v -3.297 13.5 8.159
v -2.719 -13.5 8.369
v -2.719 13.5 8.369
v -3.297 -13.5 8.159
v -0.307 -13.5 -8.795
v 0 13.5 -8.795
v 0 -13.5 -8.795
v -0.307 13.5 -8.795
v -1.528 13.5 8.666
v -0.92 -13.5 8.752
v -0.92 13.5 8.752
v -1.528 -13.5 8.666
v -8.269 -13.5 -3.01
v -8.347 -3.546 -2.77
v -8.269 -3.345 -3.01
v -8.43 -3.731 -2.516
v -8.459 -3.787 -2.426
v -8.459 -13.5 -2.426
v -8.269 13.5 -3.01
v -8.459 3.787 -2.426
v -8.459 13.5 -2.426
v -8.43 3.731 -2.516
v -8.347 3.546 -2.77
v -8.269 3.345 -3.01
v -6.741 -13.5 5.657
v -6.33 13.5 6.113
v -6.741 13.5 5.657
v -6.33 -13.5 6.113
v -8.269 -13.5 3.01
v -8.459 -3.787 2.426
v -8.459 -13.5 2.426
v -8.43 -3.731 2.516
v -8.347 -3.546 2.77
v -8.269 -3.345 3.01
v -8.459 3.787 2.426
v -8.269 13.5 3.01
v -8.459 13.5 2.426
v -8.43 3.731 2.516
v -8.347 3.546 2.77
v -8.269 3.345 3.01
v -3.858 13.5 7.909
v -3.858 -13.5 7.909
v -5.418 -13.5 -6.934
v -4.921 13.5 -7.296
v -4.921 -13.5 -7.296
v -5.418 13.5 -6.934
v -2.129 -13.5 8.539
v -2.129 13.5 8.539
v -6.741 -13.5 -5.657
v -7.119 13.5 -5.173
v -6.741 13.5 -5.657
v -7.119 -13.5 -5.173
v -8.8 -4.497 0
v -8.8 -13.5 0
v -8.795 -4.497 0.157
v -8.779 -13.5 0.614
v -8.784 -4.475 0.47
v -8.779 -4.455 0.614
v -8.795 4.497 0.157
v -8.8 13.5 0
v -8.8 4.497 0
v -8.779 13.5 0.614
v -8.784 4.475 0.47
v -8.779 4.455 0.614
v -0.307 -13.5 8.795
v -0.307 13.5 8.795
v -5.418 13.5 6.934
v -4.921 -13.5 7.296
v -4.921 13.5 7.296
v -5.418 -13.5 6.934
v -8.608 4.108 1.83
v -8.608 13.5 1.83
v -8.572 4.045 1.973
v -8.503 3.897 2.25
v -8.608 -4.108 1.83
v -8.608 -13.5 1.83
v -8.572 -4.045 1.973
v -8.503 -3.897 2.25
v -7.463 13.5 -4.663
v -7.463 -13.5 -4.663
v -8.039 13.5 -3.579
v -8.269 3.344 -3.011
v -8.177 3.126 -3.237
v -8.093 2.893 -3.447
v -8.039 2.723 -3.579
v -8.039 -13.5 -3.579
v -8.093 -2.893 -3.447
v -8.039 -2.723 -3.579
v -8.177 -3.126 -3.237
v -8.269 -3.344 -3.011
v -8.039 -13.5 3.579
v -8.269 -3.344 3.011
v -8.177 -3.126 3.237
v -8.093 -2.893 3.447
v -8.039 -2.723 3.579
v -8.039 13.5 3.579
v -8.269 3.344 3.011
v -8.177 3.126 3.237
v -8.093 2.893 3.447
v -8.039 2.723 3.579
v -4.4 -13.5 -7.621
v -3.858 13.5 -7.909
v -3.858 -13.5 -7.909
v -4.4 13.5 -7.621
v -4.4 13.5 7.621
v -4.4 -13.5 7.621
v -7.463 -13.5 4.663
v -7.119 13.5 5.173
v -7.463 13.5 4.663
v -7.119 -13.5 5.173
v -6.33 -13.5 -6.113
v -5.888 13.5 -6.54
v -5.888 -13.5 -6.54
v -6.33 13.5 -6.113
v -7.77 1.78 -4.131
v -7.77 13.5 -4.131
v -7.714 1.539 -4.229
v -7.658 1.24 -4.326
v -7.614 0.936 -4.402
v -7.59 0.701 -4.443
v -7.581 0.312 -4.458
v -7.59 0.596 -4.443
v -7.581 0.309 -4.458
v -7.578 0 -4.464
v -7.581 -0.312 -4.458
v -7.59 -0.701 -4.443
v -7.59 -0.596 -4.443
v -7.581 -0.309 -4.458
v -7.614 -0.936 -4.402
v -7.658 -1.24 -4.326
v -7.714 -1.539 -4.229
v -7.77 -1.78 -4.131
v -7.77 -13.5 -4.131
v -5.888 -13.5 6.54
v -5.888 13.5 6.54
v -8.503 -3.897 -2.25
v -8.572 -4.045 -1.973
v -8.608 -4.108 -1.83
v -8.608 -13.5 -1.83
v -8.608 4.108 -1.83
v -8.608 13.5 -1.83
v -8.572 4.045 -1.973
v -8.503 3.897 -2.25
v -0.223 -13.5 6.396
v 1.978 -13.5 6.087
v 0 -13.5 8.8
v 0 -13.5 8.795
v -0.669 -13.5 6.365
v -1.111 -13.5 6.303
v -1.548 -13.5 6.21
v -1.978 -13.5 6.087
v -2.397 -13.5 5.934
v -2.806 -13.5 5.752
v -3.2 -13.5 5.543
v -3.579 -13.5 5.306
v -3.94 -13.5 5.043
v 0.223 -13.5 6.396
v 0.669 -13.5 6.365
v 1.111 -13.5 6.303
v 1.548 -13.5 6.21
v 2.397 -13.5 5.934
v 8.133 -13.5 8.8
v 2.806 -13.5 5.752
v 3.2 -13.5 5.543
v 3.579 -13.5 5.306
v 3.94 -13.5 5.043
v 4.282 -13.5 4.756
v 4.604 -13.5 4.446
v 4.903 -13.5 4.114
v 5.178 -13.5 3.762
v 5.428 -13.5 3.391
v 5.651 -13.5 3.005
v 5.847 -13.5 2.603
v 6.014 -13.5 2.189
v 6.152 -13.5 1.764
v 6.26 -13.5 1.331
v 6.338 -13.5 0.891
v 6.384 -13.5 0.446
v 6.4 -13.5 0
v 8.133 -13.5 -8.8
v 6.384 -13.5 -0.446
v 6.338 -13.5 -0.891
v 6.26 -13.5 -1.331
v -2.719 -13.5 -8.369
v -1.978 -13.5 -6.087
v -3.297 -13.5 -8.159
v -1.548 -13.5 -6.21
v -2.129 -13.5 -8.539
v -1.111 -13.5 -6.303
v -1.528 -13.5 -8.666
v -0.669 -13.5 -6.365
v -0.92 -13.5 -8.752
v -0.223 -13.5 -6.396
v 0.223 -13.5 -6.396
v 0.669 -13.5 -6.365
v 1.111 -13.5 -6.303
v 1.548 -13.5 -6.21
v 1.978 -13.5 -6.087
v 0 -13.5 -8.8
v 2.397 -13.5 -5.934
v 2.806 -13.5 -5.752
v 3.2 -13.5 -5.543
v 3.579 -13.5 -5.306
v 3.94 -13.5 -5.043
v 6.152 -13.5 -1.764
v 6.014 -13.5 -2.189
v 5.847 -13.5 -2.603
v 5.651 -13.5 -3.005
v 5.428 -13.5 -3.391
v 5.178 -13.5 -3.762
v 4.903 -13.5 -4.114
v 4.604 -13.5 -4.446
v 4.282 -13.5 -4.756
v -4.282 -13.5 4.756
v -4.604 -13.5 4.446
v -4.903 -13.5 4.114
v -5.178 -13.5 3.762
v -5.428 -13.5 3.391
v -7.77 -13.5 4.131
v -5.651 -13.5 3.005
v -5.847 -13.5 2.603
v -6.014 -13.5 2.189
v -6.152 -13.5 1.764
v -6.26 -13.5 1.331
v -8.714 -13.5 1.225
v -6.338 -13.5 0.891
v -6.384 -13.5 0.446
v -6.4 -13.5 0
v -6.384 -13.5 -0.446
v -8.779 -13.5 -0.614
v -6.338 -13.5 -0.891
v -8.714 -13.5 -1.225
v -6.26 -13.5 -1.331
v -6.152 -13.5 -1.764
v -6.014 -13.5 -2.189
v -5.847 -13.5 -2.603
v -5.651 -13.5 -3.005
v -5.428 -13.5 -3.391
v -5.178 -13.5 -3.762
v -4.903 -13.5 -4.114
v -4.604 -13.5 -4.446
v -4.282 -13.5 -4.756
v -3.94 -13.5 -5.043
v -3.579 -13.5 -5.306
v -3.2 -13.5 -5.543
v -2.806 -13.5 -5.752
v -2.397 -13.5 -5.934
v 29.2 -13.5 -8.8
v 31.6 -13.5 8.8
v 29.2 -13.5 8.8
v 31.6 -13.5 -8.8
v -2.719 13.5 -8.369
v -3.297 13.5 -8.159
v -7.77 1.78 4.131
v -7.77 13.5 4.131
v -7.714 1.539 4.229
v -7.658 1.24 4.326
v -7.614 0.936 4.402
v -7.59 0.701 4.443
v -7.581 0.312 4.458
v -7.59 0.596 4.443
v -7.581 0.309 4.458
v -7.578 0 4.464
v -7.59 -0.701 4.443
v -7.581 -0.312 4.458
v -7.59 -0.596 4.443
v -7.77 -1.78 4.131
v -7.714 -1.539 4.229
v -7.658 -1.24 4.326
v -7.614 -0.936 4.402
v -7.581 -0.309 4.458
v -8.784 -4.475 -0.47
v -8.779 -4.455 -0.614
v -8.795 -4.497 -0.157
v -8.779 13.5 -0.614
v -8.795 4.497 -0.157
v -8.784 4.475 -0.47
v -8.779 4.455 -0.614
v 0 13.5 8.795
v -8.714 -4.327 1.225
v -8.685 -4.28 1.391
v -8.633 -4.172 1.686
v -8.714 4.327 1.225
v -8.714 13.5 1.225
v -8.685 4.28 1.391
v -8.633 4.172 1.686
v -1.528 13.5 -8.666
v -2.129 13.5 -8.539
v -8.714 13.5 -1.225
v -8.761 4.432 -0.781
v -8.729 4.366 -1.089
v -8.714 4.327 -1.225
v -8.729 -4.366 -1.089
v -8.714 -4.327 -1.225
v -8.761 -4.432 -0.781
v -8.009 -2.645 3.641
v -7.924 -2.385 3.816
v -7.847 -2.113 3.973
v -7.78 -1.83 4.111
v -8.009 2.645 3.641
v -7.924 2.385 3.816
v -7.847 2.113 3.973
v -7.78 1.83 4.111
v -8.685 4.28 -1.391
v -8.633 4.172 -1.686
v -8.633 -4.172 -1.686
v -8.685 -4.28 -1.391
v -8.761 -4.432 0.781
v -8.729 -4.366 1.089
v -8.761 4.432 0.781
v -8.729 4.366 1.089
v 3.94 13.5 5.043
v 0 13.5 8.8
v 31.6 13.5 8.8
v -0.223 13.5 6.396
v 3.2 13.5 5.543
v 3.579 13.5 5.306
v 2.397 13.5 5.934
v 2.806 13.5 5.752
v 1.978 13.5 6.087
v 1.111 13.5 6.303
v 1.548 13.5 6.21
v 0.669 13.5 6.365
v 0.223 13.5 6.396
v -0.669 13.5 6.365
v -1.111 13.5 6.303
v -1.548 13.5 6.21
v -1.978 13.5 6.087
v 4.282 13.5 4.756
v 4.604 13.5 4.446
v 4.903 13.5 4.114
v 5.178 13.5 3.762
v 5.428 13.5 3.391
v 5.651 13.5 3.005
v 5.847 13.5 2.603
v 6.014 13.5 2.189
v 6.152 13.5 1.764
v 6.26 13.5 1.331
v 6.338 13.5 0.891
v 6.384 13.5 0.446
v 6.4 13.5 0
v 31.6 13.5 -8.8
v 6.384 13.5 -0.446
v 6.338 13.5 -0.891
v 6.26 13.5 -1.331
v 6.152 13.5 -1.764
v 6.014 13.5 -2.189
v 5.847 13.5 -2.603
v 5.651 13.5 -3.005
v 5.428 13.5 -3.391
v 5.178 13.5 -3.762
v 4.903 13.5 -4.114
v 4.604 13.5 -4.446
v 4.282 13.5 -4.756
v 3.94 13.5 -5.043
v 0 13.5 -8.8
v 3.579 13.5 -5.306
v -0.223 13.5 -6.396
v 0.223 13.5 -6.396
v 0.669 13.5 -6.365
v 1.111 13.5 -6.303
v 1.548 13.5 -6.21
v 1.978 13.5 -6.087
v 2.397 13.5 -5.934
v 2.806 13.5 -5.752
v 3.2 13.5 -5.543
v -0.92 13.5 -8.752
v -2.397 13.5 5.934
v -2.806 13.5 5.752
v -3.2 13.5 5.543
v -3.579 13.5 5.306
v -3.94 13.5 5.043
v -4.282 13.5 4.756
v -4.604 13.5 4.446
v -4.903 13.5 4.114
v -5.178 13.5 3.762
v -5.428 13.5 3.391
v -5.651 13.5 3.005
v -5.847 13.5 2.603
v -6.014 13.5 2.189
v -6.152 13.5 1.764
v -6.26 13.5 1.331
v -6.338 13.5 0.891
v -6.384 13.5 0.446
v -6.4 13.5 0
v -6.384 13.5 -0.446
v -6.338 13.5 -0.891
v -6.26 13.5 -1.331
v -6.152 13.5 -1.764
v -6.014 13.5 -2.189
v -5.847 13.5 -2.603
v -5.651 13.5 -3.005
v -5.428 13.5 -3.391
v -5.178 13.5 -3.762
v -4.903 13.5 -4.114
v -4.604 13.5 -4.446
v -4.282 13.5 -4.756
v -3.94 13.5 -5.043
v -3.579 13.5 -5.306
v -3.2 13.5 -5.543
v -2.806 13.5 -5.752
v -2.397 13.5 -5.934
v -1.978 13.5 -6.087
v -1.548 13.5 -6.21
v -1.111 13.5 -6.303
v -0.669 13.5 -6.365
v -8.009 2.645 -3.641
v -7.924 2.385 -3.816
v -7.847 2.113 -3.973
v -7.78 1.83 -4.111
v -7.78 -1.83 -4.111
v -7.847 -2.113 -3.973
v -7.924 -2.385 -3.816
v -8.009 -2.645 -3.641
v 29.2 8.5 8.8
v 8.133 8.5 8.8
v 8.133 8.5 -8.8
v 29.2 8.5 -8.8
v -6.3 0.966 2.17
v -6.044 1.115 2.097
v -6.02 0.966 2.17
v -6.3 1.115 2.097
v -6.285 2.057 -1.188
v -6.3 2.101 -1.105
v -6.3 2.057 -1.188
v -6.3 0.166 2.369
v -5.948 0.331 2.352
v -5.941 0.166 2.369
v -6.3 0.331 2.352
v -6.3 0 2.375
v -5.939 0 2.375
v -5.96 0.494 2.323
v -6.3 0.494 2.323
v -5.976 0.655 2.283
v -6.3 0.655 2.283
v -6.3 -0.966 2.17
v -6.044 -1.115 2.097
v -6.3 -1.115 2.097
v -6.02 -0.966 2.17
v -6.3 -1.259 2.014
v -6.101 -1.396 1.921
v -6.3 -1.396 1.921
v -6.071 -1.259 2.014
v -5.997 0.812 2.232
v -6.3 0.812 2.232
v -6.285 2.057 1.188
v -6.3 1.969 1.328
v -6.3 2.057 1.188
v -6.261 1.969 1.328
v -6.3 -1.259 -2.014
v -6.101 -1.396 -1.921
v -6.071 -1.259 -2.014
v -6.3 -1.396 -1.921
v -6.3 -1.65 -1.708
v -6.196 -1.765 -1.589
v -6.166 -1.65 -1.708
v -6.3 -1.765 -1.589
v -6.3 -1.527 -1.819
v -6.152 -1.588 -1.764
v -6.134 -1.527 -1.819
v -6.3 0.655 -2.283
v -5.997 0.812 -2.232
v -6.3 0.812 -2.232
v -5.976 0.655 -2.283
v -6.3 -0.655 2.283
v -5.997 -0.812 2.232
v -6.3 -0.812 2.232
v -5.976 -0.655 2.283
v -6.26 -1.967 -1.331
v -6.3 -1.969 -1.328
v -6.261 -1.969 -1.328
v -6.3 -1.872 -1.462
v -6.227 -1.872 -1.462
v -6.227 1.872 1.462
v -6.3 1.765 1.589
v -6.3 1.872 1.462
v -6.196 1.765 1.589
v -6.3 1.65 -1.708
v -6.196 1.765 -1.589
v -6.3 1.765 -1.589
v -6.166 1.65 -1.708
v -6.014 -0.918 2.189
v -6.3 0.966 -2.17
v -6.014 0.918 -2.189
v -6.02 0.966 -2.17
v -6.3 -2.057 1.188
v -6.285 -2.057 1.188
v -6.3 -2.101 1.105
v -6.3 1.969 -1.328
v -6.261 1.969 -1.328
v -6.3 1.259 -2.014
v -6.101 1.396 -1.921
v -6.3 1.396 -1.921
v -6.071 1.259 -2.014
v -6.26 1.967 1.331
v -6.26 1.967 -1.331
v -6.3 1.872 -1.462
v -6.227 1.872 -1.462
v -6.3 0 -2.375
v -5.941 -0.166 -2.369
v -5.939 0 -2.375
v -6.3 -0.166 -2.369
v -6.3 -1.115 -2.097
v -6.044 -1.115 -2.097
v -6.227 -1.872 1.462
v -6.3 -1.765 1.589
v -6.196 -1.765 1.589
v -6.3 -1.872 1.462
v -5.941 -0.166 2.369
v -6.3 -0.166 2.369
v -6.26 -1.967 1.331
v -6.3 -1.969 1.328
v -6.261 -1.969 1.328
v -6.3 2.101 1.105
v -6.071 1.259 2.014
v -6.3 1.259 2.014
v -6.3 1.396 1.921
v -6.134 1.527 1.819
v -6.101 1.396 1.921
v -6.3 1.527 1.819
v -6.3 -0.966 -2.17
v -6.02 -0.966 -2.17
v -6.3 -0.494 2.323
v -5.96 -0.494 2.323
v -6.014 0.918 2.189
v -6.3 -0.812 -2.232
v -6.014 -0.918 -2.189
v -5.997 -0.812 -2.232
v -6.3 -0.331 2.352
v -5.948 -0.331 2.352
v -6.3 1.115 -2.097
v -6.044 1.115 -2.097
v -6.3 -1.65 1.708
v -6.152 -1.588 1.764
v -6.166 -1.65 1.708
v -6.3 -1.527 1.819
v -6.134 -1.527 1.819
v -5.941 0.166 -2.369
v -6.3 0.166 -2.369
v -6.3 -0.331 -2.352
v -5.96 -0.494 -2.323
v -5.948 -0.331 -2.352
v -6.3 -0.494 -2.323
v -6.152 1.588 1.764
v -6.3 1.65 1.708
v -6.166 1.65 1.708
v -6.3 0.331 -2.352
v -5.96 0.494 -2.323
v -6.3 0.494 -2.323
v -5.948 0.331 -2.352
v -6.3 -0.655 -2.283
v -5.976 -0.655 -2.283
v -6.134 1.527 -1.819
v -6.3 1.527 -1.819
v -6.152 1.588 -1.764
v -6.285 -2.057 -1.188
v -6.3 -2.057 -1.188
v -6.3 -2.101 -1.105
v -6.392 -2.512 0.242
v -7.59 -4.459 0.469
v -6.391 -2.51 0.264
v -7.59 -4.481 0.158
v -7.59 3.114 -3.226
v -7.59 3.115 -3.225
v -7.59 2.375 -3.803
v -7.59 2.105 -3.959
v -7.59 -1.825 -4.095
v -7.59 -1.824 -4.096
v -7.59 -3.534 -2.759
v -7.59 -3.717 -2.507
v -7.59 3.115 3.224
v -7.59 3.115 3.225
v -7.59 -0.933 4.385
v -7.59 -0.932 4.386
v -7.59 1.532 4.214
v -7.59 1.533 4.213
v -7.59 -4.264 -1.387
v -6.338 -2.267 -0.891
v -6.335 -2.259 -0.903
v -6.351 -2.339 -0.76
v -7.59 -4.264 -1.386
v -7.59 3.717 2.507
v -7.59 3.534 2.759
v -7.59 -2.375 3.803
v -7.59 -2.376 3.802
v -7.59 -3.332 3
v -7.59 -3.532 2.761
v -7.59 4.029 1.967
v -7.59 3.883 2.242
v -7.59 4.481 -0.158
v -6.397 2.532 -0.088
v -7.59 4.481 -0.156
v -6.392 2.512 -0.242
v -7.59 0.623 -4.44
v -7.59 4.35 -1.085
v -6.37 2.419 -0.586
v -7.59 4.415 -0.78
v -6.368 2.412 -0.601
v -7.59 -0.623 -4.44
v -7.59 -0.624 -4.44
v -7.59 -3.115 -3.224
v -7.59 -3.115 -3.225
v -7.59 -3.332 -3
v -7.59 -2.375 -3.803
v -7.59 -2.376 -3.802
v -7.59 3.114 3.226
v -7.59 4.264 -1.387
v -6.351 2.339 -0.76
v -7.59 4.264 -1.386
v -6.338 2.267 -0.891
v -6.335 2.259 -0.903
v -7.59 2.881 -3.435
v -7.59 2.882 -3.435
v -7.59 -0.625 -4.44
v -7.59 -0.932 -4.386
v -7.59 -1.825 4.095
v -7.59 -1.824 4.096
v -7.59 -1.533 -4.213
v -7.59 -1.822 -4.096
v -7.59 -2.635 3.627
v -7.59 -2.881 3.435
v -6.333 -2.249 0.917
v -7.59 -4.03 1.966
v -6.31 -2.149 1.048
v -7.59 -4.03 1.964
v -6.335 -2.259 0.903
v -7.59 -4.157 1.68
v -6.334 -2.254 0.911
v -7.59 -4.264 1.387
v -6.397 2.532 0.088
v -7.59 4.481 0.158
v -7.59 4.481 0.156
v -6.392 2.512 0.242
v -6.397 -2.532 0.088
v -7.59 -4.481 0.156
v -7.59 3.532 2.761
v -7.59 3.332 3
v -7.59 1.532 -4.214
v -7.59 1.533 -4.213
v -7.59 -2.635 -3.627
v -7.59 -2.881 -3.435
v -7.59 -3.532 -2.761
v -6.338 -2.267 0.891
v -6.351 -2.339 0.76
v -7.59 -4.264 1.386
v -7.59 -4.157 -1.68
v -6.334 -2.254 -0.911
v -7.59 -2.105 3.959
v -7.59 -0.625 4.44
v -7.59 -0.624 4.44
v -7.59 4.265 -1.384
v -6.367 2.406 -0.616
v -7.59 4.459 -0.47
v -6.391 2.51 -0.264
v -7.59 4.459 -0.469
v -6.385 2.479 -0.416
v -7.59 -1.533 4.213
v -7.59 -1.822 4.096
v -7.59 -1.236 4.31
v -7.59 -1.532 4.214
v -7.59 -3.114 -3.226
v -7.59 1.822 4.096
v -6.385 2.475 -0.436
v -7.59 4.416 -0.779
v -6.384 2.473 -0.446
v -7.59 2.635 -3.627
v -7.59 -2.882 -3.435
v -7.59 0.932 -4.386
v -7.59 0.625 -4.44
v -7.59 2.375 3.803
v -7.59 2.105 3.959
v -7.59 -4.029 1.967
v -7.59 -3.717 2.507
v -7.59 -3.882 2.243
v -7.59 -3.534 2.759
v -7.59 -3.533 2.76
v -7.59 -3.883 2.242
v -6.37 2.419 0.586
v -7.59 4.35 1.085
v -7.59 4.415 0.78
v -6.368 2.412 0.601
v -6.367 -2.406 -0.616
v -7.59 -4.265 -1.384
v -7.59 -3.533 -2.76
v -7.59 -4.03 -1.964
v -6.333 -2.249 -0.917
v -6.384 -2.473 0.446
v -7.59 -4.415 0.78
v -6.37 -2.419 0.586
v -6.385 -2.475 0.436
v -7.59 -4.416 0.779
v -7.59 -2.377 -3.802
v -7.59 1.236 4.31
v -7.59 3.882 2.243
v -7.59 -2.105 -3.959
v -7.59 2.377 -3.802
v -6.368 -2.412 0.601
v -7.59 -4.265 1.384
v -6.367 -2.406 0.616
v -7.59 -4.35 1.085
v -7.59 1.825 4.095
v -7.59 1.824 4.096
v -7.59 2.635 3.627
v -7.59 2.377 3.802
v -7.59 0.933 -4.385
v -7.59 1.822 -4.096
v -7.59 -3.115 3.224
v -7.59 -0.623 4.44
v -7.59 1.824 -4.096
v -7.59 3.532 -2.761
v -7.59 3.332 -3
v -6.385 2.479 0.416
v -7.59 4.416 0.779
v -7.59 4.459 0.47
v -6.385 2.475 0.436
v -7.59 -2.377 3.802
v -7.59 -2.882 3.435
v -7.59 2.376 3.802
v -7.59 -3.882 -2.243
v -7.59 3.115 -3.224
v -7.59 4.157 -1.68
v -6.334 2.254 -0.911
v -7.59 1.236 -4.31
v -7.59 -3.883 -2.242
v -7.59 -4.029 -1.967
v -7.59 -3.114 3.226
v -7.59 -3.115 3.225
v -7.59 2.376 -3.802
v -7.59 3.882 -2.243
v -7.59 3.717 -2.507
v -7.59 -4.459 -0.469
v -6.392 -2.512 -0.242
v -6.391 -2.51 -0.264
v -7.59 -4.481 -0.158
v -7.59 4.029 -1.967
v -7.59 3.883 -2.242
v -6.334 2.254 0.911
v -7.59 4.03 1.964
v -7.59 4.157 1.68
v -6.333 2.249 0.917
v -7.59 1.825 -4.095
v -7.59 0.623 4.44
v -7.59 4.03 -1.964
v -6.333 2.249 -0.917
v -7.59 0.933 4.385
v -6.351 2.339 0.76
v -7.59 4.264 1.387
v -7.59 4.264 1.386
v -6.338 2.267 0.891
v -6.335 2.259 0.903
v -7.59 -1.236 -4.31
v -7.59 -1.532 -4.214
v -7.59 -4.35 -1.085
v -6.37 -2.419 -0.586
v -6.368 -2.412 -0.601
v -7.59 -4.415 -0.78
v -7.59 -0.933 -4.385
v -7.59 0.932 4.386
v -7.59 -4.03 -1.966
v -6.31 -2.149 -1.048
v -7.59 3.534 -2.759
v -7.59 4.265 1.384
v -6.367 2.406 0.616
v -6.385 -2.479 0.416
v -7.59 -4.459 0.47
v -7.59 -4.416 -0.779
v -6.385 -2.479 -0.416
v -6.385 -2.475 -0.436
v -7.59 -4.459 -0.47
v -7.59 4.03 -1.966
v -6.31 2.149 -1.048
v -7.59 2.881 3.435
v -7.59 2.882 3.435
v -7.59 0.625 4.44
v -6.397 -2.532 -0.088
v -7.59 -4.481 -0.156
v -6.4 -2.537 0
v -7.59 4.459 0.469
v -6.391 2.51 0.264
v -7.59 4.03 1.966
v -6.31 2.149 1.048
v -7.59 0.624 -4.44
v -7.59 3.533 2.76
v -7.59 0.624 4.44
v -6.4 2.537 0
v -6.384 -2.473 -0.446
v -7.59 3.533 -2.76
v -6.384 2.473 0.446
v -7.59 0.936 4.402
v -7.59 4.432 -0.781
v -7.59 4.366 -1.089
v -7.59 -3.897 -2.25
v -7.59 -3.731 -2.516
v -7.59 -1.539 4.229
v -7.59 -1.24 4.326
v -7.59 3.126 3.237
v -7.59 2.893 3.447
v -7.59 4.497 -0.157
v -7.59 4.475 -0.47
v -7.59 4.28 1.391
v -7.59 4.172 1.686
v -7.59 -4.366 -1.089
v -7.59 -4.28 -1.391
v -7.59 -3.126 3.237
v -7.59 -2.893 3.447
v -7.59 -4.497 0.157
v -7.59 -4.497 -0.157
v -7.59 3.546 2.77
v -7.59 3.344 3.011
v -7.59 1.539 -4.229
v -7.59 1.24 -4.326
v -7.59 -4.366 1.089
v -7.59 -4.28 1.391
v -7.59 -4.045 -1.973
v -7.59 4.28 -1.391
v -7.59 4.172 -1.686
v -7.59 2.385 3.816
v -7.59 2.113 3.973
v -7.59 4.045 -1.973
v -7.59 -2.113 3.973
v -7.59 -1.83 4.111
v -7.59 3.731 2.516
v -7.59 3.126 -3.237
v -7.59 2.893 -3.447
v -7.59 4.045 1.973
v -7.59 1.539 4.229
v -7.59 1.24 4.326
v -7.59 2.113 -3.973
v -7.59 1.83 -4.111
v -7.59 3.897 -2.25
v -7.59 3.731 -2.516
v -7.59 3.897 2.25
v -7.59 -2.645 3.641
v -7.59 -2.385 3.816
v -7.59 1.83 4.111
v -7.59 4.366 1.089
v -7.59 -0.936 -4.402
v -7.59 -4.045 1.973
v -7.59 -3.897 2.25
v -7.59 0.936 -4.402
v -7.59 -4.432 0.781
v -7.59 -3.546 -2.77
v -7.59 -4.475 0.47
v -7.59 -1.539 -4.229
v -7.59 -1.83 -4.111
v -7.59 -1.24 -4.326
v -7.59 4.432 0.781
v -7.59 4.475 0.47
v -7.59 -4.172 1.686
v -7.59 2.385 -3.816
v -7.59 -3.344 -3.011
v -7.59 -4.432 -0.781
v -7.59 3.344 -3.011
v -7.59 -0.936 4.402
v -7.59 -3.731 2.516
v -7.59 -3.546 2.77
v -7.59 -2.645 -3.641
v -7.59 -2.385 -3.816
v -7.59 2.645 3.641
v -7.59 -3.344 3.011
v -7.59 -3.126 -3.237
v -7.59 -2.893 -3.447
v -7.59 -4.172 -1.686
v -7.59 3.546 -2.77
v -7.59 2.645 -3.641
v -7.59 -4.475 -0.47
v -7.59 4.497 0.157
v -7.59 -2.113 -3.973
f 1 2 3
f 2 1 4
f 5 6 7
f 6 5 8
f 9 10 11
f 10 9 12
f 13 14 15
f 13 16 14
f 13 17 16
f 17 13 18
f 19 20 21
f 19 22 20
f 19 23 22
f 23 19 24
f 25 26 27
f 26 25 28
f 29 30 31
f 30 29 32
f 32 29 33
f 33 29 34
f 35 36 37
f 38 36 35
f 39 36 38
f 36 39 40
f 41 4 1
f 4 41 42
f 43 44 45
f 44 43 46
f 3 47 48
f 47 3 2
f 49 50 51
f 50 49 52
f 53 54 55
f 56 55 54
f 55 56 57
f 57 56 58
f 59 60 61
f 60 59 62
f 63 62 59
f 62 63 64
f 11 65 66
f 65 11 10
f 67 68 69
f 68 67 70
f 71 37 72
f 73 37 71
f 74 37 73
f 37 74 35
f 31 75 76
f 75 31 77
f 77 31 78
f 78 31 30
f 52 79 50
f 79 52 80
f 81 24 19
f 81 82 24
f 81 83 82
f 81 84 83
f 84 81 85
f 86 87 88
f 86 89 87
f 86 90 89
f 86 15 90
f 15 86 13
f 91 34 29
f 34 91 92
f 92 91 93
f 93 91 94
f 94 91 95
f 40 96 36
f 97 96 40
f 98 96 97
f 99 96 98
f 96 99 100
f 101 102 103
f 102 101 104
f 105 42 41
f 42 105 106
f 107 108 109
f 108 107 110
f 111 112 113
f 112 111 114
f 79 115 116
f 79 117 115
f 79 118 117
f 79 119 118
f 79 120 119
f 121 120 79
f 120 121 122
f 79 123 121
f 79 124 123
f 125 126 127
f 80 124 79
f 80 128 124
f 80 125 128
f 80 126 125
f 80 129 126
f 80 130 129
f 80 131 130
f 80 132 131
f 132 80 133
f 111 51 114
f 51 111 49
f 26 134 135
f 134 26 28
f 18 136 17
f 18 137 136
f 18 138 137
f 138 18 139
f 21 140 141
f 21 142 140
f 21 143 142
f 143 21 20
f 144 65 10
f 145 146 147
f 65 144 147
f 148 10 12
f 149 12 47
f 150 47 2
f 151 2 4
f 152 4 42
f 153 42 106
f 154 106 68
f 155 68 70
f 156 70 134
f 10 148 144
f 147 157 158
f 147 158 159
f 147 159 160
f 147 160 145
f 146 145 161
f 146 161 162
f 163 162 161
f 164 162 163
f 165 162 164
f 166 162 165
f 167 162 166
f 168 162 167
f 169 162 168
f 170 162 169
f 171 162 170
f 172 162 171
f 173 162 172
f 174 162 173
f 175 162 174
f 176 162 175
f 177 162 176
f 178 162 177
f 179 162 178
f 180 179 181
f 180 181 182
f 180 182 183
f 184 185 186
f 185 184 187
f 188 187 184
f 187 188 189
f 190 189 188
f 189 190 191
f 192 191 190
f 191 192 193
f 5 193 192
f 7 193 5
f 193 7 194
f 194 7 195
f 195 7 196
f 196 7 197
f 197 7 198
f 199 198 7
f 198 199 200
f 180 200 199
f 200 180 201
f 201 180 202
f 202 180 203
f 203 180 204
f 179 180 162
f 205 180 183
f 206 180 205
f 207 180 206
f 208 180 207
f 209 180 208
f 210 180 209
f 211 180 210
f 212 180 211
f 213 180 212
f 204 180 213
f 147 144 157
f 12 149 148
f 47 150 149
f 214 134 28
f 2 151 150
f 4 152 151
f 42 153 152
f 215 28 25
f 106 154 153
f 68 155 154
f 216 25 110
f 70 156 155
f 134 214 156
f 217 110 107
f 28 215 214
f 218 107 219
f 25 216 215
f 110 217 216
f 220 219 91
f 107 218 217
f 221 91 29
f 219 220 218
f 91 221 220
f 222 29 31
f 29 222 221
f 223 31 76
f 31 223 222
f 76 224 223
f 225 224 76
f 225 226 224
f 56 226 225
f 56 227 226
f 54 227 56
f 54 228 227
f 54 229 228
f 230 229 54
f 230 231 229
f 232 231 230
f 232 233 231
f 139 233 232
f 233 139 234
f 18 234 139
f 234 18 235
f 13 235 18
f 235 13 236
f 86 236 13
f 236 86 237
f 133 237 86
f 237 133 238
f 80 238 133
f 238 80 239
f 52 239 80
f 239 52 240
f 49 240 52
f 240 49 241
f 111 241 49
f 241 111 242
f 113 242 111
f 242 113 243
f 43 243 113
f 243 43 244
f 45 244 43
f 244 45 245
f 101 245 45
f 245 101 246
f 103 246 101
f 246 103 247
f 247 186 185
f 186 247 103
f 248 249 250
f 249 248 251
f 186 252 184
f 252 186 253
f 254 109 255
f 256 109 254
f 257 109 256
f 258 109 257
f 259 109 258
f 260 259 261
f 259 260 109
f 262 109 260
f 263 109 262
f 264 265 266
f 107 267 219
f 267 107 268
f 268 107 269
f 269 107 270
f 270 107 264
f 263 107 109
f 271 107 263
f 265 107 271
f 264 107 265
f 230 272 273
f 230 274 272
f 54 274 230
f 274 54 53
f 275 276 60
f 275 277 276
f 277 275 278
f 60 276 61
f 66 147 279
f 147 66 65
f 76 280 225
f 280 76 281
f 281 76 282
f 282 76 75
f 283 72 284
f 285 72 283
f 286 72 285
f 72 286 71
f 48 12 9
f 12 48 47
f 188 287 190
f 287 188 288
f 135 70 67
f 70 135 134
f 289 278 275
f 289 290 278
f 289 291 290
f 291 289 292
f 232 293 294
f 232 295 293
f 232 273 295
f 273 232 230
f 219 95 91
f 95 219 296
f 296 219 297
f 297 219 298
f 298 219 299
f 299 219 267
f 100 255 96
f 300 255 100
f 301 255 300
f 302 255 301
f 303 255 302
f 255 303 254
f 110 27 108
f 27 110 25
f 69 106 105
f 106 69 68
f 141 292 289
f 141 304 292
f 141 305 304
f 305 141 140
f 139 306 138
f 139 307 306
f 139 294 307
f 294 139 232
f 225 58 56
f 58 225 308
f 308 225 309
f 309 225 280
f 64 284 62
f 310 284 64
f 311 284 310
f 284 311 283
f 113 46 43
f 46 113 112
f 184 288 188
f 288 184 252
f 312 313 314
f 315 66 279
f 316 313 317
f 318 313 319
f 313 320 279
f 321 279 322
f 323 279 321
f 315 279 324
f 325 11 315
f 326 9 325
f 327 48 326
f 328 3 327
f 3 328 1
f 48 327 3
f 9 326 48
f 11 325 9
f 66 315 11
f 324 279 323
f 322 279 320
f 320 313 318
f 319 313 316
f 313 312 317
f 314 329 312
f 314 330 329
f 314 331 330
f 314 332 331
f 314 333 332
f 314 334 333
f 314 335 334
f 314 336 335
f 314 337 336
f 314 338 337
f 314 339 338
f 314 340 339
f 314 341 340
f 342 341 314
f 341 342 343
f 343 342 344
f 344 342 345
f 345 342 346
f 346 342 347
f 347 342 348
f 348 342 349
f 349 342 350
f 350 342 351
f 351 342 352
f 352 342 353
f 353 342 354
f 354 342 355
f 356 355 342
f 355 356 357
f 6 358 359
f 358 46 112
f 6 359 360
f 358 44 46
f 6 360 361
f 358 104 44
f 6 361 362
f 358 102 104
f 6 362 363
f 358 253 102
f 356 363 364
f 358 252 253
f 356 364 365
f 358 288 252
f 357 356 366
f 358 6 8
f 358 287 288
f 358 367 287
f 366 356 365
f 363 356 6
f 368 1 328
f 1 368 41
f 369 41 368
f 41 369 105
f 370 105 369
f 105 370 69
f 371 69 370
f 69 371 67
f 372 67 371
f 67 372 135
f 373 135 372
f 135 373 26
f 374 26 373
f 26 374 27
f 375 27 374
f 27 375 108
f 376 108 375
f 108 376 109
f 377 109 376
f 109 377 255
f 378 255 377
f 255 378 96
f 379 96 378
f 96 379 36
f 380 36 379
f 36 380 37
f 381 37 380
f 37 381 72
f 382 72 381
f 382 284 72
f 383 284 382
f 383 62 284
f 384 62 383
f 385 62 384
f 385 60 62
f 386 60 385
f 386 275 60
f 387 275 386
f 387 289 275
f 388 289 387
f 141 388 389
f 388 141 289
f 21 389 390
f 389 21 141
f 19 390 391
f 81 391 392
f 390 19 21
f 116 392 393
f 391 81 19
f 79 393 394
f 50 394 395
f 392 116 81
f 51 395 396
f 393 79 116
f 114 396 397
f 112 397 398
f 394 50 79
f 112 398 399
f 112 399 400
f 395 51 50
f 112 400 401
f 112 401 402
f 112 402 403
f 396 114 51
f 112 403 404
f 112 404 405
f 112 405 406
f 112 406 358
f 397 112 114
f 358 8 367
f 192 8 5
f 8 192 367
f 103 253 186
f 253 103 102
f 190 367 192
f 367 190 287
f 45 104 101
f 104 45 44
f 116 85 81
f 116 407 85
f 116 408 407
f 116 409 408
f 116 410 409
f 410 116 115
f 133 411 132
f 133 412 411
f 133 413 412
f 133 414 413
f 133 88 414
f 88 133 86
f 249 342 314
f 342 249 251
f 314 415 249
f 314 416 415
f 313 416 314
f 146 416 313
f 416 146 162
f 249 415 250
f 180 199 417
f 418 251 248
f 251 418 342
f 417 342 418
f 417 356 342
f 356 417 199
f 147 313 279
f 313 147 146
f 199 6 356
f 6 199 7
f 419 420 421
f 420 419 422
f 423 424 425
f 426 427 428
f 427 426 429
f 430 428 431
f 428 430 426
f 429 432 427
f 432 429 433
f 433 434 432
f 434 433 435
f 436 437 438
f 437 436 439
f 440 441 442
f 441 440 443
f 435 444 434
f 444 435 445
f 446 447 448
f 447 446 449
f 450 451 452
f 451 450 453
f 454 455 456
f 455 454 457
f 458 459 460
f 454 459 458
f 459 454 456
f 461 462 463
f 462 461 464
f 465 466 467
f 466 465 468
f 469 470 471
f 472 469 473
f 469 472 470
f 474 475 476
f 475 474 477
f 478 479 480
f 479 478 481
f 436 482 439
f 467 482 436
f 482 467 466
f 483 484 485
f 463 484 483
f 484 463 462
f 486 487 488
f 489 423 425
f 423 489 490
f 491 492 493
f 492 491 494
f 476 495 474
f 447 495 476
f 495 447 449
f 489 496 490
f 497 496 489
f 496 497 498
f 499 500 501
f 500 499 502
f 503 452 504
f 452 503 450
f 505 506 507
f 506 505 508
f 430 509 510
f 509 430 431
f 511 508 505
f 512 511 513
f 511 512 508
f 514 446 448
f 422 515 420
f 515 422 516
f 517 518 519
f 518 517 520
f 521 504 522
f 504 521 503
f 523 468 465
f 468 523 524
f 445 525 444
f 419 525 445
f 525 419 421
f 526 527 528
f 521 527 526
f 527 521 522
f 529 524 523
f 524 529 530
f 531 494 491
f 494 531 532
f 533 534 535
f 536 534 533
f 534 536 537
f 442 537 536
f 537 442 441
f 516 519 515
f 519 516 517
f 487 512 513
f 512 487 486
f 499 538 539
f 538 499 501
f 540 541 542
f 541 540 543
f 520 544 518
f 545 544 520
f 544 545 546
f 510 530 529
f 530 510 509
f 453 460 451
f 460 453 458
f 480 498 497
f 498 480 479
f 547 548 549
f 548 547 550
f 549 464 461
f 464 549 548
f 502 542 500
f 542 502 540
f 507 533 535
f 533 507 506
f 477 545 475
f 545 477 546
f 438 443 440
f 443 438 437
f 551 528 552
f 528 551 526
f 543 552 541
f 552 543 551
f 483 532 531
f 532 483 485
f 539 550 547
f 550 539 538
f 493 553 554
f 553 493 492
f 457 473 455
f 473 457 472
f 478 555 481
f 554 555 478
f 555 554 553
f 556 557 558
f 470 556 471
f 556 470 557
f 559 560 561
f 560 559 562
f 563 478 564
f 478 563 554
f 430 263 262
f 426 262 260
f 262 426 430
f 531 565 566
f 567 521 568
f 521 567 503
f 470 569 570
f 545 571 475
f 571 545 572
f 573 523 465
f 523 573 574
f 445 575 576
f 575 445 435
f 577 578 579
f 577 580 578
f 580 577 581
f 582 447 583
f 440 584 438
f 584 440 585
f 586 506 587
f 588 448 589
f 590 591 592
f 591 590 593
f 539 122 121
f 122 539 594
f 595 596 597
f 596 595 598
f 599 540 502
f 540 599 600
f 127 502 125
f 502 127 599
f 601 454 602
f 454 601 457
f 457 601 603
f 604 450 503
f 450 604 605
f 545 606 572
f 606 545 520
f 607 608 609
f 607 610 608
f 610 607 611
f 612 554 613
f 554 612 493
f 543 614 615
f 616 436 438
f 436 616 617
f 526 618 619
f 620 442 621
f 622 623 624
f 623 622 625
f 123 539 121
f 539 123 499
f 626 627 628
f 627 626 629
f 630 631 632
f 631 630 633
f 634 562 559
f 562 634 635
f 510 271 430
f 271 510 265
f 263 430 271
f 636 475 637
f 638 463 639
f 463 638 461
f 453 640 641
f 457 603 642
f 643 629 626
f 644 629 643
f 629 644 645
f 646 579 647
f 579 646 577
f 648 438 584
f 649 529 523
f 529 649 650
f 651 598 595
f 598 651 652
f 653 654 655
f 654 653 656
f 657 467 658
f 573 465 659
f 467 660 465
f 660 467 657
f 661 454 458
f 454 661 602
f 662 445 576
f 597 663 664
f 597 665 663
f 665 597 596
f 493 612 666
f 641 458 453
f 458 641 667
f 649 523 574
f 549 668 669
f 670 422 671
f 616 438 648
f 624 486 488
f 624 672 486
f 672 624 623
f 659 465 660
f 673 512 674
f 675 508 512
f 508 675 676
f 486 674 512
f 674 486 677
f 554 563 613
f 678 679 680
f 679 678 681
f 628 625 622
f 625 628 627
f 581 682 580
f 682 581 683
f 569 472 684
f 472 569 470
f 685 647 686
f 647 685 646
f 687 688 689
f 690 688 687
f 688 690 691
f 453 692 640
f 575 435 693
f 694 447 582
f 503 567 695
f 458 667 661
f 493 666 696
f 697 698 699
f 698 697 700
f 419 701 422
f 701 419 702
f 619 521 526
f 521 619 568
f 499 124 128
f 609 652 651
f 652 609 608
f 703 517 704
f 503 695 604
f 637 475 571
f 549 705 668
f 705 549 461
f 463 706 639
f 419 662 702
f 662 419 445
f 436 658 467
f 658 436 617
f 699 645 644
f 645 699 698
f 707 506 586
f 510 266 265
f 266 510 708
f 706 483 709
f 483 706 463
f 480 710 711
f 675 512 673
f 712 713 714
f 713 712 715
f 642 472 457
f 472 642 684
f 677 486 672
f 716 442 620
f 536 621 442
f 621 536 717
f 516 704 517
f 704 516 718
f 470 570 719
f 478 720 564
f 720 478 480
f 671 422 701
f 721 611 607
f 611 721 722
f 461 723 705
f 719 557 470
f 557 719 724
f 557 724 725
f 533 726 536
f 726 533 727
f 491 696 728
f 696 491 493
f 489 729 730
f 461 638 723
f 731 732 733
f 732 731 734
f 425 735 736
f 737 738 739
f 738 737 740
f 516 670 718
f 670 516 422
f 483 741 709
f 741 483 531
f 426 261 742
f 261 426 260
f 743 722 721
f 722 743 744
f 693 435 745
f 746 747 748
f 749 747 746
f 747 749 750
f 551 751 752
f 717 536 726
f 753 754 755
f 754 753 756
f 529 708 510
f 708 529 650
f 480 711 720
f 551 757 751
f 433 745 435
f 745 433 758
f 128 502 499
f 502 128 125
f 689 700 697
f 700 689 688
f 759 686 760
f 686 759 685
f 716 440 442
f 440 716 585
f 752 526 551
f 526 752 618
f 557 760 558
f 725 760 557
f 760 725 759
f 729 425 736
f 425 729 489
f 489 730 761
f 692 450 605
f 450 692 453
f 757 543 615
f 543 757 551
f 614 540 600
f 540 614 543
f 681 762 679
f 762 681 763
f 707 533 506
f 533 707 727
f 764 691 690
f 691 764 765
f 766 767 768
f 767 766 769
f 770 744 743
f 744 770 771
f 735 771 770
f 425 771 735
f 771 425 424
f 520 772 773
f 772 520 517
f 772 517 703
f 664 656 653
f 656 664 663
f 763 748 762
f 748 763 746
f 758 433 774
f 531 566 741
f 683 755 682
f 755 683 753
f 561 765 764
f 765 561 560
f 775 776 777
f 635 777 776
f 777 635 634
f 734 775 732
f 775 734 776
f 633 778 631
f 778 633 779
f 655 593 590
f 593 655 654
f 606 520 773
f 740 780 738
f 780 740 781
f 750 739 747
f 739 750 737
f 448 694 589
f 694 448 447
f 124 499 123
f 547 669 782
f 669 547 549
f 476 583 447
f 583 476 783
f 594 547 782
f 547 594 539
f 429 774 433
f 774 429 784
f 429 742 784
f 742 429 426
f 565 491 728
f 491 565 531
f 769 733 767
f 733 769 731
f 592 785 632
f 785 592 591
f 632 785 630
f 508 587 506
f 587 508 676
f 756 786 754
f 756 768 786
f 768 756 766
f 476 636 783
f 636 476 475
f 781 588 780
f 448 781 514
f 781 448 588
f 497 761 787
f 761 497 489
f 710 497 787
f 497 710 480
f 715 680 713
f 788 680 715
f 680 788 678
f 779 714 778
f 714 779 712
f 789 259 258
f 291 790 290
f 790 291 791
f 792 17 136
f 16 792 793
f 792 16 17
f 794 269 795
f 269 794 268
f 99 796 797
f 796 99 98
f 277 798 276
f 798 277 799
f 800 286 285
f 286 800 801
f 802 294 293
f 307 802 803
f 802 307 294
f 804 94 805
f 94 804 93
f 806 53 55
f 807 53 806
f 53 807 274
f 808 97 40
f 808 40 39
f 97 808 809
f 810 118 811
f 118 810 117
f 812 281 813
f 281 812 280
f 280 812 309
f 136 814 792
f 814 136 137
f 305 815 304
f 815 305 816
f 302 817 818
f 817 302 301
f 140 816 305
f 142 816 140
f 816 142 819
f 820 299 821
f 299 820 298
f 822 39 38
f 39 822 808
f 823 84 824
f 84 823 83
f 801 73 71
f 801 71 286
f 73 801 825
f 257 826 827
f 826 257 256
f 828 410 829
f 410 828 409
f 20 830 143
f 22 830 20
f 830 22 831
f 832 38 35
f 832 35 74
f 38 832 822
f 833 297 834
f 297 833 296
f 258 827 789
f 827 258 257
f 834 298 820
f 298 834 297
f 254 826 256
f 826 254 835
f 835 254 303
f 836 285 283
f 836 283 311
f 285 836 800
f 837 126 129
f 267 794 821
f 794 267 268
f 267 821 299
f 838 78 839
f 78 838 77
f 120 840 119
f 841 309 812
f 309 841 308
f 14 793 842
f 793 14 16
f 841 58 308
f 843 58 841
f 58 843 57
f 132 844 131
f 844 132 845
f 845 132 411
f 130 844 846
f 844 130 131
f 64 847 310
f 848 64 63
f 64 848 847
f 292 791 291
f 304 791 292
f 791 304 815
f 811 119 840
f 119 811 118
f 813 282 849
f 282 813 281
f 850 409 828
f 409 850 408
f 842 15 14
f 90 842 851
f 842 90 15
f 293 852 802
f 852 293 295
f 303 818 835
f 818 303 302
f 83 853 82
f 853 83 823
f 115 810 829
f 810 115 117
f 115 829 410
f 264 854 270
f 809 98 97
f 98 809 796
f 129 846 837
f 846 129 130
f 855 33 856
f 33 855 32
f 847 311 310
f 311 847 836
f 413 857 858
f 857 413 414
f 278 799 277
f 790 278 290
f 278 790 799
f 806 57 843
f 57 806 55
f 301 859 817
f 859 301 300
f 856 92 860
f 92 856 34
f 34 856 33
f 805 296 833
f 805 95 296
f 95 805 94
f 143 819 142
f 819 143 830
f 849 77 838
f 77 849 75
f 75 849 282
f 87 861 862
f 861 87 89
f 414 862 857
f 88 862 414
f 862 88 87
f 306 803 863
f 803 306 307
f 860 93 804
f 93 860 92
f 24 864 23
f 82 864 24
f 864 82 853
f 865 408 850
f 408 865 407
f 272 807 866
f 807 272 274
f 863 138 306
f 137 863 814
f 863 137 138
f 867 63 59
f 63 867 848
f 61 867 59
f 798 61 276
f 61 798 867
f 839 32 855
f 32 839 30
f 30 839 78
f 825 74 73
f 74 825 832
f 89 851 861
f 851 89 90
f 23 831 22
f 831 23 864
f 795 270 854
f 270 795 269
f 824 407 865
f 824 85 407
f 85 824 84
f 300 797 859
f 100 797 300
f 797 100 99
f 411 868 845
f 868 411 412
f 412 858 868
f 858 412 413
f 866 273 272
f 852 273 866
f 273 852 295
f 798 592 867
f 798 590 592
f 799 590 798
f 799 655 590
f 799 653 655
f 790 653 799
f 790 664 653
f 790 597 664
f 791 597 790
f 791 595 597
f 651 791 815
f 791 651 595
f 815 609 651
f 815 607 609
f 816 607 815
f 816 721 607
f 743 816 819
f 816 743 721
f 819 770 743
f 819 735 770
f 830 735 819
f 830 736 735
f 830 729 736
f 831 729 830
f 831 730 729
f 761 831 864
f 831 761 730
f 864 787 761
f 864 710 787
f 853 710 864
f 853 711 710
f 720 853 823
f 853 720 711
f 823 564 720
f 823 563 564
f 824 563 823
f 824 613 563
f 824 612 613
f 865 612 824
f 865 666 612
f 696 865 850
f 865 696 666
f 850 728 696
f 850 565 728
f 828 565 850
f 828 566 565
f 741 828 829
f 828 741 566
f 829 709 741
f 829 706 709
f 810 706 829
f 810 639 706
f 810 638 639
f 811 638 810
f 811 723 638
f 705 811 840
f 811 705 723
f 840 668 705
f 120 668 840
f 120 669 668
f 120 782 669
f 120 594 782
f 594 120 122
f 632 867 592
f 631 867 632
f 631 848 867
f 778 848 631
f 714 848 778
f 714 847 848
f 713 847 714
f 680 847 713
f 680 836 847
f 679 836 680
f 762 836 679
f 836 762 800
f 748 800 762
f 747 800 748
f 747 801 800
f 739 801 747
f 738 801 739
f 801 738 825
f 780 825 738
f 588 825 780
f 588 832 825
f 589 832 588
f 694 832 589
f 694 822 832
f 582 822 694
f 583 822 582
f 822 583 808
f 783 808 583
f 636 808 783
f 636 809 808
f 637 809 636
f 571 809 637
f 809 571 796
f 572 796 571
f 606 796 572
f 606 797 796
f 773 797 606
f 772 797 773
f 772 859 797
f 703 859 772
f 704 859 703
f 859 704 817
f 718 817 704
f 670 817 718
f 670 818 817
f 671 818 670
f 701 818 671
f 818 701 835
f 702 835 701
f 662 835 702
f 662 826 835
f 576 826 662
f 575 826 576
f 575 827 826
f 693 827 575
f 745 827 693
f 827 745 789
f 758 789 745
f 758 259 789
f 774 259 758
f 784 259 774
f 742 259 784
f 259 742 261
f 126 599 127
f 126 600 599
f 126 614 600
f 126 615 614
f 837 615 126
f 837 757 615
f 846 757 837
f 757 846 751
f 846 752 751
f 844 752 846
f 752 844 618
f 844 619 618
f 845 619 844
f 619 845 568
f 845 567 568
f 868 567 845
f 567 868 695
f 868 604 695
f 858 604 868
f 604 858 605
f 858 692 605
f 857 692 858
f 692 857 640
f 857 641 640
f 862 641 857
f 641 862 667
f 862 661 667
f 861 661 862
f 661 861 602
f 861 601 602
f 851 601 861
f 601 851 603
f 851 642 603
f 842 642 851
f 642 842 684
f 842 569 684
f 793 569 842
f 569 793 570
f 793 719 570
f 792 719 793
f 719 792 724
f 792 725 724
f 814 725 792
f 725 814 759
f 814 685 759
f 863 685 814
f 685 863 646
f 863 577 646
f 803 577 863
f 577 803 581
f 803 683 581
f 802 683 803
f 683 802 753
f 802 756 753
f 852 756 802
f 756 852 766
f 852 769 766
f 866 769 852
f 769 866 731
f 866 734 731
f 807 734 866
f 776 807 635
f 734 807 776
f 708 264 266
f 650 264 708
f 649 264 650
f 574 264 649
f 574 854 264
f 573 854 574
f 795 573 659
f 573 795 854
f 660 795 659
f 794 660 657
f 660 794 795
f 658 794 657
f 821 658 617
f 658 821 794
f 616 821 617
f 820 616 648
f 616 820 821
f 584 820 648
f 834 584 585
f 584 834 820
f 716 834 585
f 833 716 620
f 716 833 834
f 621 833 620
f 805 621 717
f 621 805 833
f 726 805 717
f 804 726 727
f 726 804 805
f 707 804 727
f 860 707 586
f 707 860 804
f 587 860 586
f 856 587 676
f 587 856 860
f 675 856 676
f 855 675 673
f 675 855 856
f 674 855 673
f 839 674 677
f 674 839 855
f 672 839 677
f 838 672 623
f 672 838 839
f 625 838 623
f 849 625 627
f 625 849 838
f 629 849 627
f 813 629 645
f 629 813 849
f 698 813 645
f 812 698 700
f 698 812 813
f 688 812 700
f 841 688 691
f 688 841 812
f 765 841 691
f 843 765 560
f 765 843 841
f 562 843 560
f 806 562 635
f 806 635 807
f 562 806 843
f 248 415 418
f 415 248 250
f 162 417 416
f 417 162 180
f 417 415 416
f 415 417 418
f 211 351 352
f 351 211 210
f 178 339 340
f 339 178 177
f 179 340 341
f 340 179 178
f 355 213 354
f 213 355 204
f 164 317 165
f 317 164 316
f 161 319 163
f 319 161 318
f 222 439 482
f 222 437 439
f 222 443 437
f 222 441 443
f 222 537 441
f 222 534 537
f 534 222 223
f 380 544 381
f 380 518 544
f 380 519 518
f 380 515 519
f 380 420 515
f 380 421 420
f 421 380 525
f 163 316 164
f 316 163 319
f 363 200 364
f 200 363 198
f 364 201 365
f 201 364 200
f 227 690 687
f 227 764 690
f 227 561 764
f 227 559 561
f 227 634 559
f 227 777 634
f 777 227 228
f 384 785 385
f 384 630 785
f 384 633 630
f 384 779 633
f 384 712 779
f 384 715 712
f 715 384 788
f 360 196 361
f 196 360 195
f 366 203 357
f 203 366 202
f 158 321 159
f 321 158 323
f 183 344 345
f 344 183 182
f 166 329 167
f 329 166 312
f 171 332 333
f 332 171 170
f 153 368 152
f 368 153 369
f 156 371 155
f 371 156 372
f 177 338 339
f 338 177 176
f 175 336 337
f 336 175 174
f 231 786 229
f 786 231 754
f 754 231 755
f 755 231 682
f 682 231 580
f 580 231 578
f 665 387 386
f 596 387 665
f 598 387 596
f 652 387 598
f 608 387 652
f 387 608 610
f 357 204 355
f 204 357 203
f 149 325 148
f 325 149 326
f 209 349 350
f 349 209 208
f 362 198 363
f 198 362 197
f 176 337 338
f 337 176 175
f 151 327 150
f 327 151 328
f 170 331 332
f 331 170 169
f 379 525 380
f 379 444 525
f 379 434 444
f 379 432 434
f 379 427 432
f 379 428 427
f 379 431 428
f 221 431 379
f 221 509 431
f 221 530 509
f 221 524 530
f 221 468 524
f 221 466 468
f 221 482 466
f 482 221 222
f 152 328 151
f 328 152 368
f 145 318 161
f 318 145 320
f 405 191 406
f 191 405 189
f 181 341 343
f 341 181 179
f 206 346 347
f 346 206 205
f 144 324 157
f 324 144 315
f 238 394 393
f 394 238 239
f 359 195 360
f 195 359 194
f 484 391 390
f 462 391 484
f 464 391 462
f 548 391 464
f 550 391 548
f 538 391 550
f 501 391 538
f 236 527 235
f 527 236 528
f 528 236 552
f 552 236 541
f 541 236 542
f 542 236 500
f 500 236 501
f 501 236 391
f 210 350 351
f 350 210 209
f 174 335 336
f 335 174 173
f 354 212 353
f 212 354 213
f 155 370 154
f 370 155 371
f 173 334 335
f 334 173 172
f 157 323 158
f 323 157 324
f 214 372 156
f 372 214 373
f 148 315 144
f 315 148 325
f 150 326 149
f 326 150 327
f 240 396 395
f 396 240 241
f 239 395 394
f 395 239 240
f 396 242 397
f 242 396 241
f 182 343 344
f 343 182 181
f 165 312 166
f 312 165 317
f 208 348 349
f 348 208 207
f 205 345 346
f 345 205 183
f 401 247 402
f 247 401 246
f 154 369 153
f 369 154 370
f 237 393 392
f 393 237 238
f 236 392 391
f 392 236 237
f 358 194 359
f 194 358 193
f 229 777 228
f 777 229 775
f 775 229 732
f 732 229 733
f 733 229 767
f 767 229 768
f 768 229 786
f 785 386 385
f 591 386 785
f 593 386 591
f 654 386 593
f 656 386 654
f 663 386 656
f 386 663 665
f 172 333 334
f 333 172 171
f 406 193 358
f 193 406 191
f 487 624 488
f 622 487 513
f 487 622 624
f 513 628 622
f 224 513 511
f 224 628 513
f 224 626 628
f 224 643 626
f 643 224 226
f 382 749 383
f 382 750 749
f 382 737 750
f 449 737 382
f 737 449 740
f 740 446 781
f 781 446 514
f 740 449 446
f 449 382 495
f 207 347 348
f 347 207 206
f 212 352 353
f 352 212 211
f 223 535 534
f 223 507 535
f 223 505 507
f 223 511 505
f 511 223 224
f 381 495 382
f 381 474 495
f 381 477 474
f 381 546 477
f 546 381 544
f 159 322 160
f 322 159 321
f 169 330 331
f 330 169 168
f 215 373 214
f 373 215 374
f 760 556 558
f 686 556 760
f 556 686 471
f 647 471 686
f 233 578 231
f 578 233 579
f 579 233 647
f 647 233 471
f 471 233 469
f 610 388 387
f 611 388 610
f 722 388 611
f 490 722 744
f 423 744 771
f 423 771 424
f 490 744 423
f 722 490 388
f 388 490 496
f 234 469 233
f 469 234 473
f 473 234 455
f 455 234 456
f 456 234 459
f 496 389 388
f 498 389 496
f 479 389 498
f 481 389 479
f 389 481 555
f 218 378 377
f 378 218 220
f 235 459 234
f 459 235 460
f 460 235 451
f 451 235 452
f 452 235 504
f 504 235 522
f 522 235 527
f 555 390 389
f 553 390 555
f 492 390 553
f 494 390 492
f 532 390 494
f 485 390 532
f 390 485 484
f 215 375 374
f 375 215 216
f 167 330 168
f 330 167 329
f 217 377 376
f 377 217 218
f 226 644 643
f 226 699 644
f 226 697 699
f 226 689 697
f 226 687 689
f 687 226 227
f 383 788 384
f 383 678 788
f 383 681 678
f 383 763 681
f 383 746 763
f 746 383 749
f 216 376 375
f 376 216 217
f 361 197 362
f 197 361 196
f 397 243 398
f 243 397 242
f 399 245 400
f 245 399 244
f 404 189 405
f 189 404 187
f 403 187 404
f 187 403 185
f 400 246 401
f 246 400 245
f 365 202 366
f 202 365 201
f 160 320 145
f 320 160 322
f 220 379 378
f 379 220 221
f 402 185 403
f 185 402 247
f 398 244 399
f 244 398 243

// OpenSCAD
// file: _common.scad
$fa=4; // default minimum facet angle is now 0.5
$fs=0.05; // default minimum facet size is now 0.05 mm

holeRad = 6.4;
wallThickness = 2.4;
insertDepth = 20;
offsetDepth = 7;
screwHoleDiam = 4.75;
countersinkDiam = 9;
footHeight = 10;
distanceFromWall = 38 - holeRad;


module chamferedScrewHole(rh, rs, d, ds, t = .1) {
  translate([0, 0, -t]) cylinder(r=rs, h=d + t);
  translate([0, 0, d - ds + t]) cylinder(r1=rs, r2=rh, h=ds + t);
  translate([0, 0, d - ds + 2*t + ds - .01]) cylinder(r=rh, h=ds + t + 5);
}
// main file
include <_common.scad>

difference() {
  union() {
    rotate([90, 0, 0]) cylinder(h = (insertDepth + offsetDepth), r = holeRad + wallThickness, center = true);
    translate([0, (insertDepth + offsetDepth) / -2, -(holeRad + wallThickness)]) cube([distanceFromWall, insertDepth + offsetDepth, 2 * (holeRad + wallThickness)]);
  }
  translate([distanceFromWall / (3 / 2) - wallThickness, -5, 0]) cube([distanceFromWall / (3 / 2), insertDepth + offsetDepth, 50], center=true);
  rotate([90, 0, 0]) cylinder(h = (insertDepth + offsetDepth) + .2, r = holeRad, center = true);
  translate([-holeRad + wallThickness, 0, 0]) rotate([0, -90, 0]) chamferedScrewHole(countersinkDiam / 2, screwHoleDiam / 2, wallThickness + 1, wallThickness / 2);
}
